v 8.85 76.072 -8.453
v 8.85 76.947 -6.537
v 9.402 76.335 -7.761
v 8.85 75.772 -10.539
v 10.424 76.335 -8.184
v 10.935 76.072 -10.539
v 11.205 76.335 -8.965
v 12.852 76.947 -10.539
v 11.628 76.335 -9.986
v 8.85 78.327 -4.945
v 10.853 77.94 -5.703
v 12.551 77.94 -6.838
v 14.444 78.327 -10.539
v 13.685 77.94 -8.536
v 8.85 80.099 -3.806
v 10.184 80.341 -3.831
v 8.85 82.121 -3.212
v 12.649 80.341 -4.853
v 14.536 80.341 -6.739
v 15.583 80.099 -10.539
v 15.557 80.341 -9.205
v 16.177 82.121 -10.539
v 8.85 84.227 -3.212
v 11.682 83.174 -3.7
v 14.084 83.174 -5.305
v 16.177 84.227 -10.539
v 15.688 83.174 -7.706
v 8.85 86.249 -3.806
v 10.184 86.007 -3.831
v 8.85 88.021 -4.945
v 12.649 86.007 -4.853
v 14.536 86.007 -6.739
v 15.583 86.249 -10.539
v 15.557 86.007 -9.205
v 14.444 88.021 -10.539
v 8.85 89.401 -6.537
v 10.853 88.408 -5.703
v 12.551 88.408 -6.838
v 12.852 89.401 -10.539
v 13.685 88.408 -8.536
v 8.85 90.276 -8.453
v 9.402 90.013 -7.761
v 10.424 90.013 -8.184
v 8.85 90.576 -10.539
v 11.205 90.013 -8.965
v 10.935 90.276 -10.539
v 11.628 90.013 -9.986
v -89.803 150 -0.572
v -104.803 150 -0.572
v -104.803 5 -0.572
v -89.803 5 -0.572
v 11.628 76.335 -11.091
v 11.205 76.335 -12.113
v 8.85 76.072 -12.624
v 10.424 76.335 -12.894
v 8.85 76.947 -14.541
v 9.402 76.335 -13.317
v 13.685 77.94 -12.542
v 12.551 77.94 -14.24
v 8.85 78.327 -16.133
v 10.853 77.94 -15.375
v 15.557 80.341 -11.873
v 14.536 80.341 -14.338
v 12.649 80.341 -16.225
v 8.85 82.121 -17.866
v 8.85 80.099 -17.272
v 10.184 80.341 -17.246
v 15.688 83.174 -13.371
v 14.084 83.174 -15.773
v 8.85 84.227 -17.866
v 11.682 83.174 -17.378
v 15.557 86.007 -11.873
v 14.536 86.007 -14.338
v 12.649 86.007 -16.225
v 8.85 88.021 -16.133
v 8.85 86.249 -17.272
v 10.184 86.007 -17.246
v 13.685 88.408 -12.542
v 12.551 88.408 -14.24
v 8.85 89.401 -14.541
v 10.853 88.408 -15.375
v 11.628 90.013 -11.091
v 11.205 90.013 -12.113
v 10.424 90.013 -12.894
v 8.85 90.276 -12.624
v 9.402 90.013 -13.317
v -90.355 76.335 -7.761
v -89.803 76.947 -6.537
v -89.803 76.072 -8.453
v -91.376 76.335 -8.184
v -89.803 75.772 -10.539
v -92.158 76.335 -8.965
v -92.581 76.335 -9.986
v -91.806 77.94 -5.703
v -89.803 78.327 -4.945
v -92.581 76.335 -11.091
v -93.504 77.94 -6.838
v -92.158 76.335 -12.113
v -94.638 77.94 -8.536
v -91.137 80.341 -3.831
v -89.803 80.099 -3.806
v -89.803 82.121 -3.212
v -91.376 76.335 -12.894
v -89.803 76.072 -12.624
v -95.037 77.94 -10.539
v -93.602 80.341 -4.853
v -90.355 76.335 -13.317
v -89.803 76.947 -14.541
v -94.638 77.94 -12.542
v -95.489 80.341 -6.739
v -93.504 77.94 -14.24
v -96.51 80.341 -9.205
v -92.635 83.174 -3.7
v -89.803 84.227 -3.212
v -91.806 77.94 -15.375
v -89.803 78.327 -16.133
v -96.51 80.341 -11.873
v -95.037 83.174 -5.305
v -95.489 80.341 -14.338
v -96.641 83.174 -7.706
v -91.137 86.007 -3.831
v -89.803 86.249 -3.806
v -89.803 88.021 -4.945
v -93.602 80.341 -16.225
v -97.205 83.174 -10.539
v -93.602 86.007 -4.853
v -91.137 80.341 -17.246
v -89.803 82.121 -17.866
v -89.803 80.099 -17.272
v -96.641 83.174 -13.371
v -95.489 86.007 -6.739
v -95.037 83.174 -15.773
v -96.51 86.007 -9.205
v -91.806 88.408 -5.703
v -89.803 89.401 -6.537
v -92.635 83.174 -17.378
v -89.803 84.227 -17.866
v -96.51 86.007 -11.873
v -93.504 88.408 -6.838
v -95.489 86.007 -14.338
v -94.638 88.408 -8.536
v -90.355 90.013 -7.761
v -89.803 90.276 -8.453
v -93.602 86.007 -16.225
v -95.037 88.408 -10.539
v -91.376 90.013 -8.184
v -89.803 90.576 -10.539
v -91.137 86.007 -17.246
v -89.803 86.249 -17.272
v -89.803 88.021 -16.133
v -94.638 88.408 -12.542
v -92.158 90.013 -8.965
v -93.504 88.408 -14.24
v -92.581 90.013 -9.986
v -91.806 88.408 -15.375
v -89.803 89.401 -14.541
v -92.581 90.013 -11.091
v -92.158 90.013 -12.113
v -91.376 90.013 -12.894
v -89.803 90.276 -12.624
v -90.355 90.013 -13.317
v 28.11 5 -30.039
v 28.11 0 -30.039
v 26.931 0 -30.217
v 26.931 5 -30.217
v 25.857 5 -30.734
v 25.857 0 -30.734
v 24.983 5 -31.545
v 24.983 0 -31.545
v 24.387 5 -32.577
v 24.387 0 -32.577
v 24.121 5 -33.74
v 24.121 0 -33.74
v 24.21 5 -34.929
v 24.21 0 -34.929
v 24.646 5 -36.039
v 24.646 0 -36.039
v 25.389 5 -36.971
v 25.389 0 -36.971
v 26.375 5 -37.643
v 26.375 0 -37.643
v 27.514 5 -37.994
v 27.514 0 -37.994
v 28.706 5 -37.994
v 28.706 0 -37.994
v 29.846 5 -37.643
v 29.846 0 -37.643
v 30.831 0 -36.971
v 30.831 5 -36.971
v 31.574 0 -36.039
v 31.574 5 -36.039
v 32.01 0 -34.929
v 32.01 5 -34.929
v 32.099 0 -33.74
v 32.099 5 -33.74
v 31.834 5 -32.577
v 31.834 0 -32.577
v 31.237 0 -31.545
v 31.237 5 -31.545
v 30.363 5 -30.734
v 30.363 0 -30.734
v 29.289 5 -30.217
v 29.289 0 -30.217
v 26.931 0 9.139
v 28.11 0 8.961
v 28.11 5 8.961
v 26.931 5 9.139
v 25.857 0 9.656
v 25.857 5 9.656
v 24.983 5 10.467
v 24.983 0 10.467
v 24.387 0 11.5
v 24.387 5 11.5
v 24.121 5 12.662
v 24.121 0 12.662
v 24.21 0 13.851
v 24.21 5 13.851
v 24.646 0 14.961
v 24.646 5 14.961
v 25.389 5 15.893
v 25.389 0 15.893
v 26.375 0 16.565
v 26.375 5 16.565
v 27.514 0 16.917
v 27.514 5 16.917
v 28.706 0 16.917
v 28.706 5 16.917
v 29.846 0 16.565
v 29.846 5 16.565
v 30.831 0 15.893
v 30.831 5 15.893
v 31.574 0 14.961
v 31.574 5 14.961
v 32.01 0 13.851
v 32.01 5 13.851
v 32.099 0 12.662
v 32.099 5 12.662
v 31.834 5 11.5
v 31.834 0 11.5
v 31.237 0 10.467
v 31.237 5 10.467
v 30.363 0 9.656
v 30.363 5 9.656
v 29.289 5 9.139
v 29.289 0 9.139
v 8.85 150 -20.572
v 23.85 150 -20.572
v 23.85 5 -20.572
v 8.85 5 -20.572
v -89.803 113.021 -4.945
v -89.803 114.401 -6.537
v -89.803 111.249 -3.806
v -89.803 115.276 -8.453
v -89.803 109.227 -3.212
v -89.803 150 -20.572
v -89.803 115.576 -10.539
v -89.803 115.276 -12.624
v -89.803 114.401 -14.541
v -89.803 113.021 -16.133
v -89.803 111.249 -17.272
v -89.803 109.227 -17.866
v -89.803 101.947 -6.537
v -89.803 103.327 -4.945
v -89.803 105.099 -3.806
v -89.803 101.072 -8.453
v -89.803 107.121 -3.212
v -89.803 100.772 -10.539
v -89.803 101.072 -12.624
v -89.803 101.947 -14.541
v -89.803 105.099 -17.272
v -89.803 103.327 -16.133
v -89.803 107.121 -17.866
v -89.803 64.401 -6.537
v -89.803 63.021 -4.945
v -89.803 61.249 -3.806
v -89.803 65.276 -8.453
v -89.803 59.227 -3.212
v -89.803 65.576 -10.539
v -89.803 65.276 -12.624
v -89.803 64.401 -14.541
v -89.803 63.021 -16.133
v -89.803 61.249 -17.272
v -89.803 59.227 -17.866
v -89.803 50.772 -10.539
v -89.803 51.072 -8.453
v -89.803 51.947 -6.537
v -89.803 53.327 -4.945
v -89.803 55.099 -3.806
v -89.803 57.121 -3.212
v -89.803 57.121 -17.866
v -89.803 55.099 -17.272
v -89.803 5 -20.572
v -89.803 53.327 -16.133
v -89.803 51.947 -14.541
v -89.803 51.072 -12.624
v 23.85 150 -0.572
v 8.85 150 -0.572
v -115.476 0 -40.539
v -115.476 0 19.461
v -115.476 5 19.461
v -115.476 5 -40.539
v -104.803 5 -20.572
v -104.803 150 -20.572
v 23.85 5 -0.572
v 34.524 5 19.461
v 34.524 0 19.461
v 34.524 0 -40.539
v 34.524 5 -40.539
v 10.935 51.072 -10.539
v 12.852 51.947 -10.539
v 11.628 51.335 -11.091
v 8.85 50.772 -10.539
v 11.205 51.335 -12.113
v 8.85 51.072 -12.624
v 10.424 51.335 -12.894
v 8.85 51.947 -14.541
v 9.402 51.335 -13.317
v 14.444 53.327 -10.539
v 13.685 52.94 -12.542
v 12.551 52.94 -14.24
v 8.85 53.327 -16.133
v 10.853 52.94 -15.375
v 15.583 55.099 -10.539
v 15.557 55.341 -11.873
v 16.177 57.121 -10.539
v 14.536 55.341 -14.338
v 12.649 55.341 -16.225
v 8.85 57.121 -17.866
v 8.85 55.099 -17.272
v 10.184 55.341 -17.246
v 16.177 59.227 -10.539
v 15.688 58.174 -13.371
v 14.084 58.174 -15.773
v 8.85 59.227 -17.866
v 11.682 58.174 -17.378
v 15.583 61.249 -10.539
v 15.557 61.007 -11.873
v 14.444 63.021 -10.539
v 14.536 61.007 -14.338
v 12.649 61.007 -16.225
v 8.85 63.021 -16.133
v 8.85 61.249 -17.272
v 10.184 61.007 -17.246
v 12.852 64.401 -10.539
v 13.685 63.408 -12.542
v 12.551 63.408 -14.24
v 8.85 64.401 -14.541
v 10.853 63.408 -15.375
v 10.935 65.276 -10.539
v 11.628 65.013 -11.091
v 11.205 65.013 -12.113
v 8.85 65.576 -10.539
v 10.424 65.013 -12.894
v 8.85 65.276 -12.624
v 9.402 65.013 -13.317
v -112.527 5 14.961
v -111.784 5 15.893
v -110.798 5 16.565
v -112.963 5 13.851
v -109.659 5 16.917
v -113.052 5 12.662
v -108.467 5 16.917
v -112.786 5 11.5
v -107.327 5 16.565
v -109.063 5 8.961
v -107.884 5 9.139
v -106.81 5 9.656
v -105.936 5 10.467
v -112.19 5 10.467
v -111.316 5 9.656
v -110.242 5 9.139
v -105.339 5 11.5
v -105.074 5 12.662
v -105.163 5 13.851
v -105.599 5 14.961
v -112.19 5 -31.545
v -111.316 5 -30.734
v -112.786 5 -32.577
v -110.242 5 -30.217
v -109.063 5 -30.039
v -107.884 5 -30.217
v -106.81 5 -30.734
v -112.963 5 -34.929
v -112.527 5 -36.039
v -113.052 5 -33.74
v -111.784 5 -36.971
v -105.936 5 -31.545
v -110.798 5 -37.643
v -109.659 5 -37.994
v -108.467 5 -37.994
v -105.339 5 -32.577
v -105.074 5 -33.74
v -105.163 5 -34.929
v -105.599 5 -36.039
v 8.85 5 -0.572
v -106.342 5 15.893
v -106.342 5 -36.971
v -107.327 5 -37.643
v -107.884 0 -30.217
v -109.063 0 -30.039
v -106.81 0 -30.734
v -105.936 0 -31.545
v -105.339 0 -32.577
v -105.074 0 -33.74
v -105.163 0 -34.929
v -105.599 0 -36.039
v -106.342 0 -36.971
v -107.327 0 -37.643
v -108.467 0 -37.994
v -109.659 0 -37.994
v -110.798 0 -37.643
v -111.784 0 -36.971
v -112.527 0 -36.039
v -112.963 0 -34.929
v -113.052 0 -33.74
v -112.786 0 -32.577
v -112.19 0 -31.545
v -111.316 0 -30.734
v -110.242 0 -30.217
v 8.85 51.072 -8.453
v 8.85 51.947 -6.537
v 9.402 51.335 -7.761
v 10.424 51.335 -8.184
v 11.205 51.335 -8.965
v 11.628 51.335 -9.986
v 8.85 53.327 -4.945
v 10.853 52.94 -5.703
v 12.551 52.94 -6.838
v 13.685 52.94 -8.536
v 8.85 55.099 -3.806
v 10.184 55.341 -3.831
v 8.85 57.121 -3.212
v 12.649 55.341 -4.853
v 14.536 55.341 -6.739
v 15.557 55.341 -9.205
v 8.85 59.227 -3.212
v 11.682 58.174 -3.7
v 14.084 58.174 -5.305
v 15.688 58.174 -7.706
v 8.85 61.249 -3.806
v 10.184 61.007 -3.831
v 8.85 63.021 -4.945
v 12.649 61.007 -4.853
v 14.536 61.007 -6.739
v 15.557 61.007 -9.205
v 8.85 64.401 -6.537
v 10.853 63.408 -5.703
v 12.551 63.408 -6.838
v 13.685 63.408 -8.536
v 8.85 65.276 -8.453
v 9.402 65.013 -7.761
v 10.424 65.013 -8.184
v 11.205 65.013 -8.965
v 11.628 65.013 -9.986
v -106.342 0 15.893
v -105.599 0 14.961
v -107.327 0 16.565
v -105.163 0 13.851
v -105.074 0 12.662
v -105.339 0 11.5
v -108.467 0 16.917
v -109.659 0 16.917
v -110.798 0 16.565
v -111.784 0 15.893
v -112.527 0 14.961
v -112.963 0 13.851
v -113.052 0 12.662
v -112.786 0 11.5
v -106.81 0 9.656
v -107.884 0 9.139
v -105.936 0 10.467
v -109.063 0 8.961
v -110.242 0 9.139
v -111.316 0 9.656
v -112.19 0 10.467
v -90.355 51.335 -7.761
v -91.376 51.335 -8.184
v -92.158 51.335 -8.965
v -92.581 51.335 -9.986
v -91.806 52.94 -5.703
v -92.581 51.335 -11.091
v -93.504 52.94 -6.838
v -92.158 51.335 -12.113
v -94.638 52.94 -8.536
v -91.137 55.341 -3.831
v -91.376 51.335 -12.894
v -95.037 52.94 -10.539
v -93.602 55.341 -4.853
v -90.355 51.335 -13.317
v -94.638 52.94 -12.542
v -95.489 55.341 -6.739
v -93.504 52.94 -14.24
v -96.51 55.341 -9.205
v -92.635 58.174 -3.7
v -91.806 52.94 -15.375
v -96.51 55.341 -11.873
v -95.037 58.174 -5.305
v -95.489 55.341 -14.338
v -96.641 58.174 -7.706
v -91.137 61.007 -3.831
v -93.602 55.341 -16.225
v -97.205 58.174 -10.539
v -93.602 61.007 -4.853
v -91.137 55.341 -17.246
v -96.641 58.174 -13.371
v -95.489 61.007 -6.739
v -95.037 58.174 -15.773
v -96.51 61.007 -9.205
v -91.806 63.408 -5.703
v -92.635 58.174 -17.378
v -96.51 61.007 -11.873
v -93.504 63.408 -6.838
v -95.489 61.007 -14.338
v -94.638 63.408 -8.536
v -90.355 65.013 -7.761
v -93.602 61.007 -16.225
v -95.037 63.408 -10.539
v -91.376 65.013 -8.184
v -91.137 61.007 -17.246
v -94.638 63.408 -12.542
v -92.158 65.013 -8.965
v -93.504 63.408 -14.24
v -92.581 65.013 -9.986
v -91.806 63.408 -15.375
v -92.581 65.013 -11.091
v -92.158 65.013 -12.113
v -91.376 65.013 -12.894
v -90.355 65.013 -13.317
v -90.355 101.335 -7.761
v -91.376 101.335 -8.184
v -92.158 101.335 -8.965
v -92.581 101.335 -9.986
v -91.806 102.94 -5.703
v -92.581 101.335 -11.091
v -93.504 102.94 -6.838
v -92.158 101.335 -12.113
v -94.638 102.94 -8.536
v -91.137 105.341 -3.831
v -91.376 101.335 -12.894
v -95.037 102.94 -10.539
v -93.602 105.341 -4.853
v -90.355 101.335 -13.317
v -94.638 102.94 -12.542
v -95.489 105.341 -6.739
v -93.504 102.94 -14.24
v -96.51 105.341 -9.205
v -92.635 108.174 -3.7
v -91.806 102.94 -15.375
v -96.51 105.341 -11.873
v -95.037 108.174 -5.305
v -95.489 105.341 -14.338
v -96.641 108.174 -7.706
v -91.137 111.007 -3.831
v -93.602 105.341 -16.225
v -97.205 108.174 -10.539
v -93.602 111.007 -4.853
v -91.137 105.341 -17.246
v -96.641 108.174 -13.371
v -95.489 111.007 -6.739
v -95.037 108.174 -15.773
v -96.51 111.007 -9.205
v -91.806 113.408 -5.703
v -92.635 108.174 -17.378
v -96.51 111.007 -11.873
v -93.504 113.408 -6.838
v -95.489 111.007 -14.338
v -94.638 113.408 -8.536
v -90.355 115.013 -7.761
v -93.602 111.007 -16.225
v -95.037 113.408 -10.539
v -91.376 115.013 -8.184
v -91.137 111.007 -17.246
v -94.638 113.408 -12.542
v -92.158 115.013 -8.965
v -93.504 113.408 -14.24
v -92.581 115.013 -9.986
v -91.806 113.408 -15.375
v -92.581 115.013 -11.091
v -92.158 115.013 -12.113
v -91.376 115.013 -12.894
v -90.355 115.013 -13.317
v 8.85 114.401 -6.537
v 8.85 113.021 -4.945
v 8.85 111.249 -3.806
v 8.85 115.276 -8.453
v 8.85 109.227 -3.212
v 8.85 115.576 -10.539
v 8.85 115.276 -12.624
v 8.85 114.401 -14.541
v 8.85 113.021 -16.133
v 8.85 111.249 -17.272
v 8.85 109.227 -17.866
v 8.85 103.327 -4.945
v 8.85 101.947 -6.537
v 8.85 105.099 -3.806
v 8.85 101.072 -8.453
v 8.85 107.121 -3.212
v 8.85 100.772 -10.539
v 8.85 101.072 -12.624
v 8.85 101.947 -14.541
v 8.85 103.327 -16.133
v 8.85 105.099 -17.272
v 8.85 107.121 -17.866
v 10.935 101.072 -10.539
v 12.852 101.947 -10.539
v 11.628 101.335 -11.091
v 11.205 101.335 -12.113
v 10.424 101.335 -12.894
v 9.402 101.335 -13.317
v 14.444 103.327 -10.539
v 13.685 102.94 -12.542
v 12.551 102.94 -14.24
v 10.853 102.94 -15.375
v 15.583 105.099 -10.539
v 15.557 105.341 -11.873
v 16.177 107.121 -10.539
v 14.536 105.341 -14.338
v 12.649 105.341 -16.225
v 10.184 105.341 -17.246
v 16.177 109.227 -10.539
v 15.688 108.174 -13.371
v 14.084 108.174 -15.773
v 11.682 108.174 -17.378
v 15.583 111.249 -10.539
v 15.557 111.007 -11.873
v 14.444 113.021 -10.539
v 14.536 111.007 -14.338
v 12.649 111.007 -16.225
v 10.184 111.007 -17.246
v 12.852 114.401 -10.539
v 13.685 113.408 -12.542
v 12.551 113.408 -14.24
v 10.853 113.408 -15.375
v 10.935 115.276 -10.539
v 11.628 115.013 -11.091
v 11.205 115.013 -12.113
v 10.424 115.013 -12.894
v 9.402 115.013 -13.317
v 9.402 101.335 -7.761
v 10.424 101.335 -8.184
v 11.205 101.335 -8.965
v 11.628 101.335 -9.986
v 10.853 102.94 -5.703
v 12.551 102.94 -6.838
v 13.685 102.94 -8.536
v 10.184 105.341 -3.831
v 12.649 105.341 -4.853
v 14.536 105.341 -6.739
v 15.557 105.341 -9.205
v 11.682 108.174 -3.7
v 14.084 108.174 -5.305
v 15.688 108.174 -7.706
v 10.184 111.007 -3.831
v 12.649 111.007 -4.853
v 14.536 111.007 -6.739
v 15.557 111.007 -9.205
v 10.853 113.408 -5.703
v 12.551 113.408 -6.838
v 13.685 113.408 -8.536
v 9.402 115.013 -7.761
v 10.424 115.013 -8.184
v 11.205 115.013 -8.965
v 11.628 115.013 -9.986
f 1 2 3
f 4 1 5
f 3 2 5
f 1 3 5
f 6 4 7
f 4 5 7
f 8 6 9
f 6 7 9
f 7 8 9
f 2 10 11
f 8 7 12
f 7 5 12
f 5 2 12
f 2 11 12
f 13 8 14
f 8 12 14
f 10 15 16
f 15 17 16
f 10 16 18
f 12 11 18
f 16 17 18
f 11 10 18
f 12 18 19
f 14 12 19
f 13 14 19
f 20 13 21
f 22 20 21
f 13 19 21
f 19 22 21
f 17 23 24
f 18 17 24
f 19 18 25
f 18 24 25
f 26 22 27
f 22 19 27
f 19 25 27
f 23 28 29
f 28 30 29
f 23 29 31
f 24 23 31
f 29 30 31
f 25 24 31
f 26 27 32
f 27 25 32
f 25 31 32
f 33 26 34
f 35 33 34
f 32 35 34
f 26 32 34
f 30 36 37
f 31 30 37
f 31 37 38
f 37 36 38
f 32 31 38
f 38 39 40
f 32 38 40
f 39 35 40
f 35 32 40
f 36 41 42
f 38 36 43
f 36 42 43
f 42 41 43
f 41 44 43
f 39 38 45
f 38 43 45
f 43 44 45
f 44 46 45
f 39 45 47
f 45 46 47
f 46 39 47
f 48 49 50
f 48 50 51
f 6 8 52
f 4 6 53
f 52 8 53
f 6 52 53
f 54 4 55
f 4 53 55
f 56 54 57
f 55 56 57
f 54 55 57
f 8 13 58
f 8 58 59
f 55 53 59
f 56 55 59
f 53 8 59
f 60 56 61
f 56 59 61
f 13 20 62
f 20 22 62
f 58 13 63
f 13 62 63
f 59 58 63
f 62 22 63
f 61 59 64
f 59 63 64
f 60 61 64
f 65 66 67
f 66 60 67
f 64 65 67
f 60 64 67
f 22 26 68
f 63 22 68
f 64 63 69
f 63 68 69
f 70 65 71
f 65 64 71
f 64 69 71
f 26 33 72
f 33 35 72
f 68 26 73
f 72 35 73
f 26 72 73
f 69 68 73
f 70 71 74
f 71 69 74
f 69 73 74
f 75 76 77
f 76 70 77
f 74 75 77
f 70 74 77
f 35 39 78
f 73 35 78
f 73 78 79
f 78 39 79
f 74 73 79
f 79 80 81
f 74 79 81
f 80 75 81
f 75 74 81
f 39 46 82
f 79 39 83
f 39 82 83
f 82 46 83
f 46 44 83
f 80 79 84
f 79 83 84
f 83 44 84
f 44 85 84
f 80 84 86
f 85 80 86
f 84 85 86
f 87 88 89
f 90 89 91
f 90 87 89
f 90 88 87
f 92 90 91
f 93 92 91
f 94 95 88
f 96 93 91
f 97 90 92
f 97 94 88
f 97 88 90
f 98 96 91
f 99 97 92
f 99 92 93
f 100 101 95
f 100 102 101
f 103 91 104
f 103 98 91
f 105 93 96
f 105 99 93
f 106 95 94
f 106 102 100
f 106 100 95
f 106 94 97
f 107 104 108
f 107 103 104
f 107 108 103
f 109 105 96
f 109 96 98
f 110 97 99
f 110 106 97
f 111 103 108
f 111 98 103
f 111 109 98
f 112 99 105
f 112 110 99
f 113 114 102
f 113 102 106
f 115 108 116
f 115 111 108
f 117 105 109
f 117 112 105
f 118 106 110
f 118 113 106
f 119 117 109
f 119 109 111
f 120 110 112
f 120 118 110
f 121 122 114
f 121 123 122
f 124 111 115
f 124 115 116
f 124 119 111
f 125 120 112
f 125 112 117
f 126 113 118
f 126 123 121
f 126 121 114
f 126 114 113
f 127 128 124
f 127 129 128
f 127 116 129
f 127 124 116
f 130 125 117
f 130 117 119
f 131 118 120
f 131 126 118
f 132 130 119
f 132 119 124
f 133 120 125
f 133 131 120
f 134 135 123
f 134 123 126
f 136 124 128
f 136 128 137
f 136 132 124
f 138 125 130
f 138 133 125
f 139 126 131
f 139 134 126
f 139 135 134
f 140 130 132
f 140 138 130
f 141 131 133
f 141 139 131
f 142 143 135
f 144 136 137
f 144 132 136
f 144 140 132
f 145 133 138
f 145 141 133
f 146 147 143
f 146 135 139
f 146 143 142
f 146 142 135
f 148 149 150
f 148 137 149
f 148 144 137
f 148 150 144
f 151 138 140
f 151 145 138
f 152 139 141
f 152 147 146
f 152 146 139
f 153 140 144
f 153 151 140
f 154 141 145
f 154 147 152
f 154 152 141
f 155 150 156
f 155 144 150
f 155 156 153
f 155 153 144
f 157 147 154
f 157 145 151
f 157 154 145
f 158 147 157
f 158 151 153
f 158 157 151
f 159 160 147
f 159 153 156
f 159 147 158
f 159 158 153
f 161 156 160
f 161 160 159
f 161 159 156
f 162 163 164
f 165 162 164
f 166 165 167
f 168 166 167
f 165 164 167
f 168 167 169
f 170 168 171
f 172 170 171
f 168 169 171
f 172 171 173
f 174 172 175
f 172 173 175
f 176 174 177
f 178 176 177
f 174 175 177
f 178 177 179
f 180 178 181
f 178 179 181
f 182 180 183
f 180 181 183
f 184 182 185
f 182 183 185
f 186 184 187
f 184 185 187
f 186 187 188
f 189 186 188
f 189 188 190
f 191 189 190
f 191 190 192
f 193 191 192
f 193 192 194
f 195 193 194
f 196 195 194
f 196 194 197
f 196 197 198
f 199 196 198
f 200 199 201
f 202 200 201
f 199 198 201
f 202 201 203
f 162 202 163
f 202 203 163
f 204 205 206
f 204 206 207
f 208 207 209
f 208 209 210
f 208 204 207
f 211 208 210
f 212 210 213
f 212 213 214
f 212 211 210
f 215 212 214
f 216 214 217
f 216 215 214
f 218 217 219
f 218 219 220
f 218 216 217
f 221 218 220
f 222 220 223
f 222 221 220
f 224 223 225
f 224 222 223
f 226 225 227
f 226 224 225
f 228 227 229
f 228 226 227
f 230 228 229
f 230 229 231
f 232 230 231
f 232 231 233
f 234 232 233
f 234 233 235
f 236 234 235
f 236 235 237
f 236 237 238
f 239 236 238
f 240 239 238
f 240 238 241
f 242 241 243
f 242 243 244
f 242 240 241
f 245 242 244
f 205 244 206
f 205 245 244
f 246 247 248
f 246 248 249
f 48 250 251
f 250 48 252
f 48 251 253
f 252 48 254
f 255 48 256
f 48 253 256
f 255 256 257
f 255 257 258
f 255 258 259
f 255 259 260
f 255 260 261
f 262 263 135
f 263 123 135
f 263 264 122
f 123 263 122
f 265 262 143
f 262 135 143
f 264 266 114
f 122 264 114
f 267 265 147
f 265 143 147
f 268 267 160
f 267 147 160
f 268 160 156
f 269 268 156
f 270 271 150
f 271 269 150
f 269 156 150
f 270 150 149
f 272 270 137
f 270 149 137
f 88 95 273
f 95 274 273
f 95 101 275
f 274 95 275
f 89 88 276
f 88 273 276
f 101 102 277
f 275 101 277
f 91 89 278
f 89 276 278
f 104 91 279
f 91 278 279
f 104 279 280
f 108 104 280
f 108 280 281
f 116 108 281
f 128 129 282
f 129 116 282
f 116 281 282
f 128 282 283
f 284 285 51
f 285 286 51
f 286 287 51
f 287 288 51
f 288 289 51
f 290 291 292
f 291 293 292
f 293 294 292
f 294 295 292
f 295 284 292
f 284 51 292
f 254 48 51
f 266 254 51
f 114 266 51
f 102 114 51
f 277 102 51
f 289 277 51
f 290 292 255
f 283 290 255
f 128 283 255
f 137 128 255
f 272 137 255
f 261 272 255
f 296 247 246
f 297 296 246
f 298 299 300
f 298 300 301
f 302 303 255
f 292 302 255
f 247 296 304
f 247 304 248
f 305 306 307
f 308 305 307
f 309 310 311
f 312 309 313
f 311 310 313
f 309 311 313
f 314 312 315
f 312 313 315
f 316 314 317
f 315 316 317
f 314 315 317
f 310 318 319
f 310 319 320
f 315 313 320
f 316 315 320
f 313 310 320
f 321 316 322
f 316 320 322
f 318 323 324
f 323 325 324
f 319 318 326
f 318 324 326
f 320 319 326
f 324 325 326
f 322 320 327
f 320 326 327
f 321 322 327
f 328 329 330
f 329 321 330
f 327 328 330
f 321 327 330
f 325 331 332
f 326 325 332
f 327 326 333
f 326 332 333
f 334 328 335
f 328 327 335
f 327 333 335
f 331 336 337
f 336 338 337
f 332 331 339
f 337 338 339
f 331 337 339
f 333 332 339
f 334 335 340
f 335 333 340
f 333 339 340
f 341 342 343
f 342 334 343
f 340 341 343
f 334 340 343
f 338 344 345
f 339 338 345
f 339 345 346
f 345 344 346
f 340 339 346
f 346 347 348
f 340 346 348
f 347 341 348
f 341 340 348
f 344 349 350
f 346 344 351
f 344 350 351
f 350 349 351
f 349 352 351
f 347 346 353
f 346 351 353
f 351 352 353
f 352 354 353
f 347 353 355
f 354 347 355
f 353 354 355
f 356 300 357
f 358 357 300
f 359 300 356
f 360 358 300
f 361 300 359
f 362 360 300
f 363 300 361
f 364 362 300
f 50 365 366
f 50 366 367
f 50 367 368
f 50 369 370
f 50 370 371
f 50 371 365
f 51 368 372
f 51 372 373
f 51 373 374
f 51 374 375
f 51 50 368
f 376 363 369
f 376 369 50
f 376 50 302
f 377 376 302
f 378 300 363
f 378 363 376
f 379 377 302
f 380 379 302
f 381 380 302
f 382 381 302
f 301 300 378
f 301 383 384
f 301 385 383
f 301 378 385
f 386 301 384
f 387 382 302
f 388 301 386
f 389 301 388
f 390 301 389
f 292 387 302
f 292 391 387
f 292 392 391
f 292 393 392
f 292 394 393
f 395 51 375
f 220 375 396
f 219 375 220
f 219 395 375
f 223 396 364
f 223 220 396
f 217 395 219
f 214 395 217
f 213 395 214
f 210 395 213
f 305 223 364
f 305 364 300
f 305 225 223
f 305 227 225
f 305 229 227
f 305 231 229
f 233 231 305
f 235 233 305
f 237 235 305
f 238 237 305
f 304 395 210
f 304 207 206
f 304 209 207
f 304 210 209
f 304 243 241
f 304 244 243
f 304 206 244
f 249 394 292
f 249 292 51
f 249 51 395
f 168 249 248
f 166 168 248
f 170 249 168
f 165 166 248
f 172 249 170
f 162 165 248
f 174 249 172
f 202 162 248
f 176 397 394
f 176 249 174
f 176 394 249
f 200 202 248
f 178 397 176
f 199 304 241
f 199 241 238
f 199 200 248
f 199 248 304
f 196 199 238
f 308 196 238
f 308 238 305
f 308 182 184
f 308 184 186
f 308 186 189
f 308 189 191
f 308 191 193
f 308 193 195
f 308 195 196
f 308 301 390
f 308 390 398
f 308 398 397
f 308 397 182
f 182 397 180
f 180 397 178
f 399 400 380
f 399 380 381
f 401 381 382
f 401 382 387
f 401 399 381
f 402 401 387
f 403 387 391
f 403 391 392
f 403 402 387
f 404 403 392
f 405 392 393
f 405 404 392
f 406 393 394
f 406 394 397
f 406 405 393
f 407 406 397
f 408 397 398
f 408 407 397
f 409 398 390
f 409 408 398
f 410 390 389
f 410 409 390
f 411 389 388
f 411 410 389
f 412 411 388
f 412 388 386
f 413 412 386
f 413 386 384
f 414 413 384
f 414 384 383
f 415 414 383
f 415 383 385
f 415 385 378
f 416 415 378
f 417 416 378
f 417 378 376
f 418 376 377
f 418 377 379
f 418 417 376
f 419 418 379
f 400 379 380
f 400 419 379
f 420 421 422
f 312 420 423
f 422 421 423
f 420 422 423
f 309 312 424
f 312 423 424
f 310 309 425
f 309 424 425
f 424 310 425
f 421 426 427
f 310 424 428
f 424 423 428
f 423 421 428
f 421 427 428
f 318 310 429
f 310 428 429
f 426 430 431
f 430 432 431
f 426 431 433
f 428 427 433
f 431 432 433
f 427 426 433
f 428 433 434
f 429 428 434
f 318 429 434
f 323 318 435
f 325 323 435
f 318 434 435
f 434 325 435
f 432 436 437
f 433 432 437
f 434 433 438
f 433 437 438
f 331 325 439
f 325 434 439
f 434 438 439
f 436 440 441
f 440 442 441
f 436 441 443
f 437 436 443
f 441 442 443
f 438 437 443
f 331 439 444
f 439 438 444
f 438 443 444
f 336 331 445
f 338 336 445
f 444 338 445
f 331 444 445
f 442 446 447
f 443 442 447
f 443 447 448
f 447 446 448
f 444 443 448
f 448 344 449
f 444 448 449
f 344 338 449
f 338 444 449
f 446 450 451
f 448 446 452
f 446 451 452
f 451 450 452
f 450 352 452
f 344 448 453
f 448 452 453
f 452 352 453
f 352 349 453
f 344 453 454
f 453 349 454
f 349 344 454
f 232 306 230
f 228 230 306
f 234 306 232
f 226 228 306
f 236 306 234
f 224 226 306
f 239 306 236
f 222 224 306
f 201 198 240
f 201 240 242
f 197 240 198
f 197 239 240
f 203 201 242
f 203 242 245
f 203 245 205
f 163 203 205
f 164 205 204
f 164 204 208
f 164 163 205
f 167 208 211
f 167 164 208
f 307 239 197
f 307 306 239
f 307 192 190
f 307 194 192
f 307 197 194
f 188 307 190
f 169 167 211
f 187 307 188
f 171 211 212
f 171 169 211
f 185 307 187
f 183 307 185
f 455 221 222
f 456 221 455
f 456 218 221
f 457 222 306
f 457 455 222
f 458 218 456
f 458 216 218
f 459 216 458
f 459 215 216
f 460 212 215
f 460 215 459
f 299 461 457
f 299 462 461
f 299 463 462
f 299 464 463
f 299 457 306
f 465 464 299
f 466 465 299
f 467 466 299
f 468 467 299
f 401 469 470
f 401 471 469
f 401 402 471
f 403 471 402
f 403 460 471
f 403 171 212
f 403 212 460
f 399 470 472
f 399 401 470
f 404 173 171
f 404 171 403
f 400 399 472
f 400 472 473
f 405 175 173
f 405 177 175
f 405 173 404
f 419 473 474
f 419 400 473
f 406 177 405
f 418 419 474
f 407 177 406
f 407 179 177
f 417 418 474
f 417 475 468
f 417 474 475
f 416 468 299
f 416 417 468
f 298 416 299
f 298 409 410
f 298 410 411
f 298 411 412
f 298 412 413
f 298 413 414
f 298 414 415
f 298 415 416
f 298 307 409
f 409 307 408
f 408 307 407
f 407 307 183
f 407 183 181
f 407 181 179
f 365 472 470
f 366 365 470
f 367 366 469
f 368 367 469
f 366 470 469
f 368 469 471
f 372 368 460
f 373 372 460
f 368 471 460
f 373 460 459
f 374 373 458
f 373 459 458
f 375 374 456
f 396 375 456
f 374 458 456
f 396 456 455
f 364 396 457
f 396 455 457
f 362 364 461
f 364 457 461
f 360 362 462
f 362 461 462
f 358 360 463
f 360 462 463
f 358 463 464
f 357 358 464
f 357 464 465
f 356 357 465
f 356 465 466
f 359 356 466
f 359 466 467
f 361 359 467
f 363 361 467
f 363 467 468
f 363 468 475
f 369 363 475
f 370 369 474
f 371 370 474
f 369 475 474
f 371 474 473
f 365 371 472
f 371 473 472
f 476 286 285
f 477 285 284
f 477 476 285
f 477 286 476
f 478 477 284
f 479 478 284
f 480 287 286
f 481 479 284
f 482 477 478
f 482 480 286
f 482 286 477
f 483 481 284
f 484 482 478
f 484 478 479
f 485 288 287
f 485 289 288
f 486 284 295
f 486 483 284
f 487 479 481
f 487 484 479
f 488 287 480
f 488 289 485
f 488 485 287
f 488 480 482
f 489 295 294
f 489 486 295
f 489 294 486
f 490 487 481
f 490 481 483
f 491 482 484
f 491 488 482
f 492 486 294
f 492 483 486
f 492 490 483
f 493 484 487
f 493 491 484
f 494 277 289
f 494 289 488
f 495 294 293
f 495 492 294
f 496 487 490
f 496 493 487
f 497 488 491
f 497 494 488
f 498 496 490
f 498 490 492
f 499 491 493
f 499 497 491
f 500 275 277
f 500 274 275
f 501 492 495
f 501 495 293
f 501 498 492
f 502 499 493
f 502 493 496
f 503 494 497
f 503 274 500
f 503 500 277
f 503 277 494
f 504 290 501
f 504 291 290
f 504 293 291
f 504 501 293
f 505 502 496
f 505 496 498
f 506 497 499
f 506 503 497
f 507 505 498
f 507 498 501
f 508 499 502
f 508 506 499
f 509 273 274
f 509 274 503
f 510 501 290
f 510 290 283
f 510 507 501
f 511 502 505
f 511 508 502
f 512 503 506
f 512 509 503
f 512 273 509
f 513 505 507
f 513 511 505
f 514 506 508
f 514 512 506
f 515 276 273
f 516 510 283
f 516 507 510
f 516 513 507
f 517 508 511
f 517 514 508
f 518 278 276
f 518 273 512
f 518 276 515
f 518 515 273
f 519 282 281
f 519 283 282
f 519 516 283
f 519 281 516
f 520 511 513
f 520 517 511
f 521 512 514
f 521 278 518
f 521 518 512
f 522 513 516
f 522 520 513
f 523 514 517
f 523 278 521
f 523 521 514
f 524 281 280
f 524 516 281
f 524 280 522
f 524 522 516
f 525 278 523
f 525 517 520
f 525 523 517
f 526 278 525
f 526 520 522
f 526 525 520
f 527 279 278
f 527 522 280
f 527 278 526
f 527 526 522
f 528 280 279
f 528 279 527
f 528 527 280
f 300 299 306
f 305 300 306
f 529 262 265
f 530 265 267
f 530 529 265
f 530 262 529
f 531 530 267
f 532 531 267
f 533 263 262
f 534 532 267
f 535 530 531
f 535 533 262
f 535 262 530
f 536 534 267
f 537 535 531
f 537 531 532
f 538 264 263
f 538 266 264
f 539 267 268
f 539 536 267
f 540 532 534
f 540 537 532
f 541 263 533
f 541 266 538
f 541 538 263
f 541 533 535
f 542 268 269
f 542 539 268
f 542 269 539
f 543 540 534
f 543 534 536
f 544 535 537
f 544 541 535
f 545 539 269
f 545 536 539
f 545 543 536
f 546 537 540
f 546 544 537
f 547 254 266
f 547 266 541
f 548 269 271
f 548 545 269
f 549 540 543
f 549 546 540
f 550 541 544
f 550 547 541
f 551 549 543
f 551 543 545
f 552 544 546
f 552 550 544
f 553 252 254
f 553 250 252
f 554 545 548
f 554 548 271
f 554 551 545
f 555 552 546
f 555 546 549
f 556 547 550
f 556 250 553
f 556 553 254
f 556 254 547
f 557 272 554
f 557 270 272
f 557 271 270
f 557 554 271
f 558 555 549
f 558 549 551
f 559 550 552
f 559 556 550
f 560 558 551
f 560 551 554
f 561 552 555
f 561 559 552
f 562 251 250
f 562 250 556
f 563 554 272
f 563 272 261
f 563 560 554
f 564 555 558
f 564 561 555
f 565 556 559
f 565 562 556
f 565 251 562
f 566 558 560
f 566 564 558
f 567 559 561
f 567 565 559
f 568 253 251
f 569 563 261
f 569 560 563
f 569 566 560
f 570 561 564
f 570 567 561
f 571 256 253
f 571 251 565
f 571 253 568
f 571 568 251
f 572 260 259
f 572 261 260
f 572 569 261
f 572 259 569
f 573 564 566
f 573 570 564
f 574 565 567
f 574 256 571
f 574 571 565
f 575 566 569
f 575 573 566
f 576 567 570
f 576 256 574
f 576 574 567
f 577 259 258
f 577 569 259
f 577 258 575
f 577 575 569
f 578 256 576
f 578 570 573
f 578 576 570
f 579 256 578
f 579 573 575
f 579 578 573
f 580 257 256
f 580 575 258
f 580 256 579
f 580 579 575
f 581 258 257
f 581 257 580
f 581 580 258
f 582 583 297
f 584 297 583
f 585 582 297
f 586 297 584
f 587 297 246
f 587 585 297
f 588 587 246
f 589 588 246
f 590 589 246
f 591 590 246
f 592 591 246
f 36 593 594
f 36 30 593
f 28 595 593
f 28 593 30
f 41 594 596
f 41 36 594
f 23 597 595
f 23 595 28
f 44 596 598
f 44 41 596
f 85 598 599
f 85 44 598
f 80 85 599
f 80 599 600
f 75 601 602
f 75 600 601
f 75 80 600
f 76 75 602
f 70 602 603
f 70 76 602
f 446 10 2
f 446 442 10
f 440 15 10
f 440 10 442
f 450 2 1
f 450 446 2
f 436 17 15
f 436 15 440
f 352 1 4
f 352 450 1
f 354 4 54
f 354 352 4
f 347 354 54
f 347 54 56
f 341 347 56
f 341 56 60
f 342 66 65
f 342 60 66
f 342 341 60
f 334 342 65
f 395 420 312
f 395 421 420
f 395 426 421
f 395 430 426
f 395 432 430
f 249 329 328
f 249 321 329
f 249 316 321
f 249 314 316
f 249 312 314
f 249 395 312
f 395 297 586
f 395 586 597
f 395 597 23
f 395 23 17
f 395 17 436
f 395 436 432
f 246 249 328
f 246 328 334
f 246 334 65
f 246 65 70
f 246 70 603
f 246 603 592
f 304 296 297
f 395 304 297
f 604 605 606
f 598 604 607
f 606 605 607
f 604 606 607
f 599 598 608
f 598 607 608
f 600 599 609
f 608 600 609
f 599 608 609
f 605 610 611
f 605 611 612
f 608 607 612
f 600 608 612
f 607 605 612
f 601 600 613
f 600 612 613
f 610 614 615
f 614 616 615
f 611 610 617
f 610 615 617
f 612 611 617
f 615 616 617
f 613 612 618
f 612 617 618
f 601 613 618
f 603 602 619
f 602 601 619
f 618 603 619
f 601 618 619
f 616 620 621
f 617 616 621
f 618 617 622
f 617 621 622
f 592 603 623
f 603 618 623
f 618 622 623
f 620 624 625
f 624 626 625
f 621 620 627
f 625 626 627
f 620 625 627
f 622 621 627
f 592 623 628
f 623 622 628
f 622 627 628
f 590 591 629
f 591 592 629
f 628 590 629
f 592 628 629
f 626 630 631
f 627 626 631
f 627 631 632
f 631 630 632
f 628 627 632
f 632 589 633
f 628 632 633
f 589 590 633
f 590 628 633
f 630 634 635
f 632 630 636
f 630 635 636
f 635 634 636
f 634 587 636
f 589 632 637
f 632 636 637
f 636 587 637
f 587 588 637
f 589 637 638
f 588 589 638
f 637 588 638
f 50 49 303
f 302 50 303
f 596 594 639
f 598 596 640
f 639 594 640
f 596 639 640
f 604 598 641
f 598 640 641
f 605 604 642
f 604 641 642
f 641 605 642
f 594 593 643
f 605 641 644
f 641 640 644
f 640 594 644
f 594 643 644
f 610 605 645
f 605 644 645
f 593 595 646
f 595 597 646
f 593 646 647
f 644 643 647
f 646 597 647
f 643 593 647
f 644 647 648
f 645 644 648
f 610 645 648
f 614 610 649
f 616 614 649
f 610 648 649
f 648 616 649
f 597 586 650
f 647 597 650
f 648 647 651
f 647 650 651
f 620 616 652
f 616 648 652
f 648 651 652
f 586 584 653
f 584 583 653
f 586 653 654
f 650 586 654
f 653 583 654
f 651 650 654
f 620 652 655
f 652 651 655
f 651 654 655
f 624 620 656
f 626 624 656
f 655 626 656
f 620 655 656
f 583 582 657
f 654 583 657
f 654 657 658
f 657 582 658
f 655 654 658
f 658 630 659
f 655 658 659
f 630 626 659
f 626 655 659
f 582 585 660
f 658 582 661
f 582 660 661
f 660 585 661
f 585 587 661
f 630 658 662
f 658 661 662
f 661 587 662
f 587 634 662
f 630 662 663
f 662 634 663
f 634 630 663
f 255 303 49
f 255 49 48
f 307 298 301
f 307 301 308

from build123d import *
from build123d.topology import SkipClean

# Parameters (mm, degrees)
SKETCH_2_W                 = 150
SKETCH_2_H                 = 60
EXTRUDE_1_DEPTH            = 5
SKETCH_3_W                 = 15
SKETCH_3_H                 = 20
EXTRUDE_2_DEPTH            = 150
PATTERN_LINEAR_1_COUNT     = 2
PATTERN_LINEAR_1_PITCH     = 25
PATTERN_LINEAR_1_COL_COUNT = 2
PATTERN_LINEAR_1_COL_PITCH = 25
SKETCH_22_R                = 4
CUT_EXTRUDE_3_DEPTH        = 5
MIRROR_19_COPY_1_SKETCH_R  = 4
MIRROR_19_COPY_1_DEPTH     = 5


with BuildPart() as part:
    # 草图2 → 凸台-拉伸1 (new body)
    with BuildSketch(Plane(origin=(0, 0, 0), x_dir=(1, 0, 0), z_dir=(0, 1, 0))):
        with Locations((-40.476378725, 10.538808084)):
            Rectangle(SKETCH_2_W, SKETCH_2_H)
    extrude(amount=EXTRUDE_1_DEPTH)

    # 草图3 → 凸台-拉伸2 (add)
    with BuildSketch(Plane(origin=(0, 0, 0), x_dir=(1, 0, 0), z_dir=(0, 1, 0))):
        with Locations((-97.302512432, 10.572361891)):
            Rectangle(SKETCH_3_W, SKETCH_3_H)
    extrude_2 = extrude(amount=EXTRUDE_2_DEPTH)

    # 草图19 → 切除-旋转29 (revolve, cut)
    with BuildSketch(Plane.XY.offset(-10.538808084)):
        with BuildLine():
            Line((-89.802512432, 90.57618696), (-89.802512432, 75.771839239))
            ThreePointArc((-89.802512432, 75.771839239), (-97.204686292, 83.1740131), (-89.802512432, 90.57618696))
        make_face()
    cut_revolve_29 = revolve(axis=Axis((-89.802512432, 90.57618696, -10.538808084), (0, -1, 0)), mode=Mode.SUBTRACT)

    # 阵列(线性)1: 切除-旋转29 ×2
    with Locations(*[(0, i * PATTERN_LINEAR_1_PITCH, 0) for i in range(1, PATTERN_LINEAR_1_COUNT)]):
        add(cut_revolve_29, mode=Mode.SUBTRACT)

    # 阵列(线性)1 col: 切除-旋转29 ×2
    with Locations(*[(0, -i * PATTERN_LINEAR_1_COL_PITCH, 0) for i in range(1, PATTERN_LINEAR_1_COL_COUNT)]):
        add(cut_revolve_29, mode=Mode.SUBTRACT)

    # 草图22 → 切除-拉伸3 (cut)
    with BuildSketch(Plane(origin=(0, 0, 0), x_dir=(1, 0, 0), z_dir=(0, 1, 0))):
        with Locations(Location((-109.062885819, 34.038808084, 0), (0, 0, 270))):
            Circle(SKETCH_22_R)
    cut_extrude_3 = extrude(amount=CUT_EXTRUDE_3_DEPTH, mode=Mode.SUBTRACT)

    # 镜向18: 切除-拉伸3 across plane
    add(cut_extrude_3.mirror(Plane.XY.offset(-10.538808084)), mode=Mode.SUBTRACT)

    # 镜向19: 切除-拉伸3 across plane
    add(cut_extrude_3.mirror(Plane(origin=(-40.476378725, 0, 0), x_dir=(0, 0, 1), z_dir=(1, 0, 0))), mode=Mode.SUBTRACT)

    # 镜向19 copy 1 sketch → 镜向19 copy 1 (cut)
    with BuildSketch(Plane(origin=(-80.95275745, 0, -21.077616169), x_dir=(-1, 0, 0), z_dir=(0, 1, 0))):
        with Locations(Location((-109.062885819, 34.038808084, 0), (0, 0, 270))):
            Circle(MIRROR_19_COPY_1_SKETCH_R)
    extrude(amount=MIRROR_19_COPY_1_DEPTH, mode=Mode.SUBTRACT)

    # 镜向20: 凸台-拉伸2 across plane
    add(extrude_2.mirror(Plane(origin=(-40.476378725, 0, 0), x_dir=(0, 0, 1), z_dir=(1, 0, 0))))

    # 镜向21: 切除-旋转29 across plane
    with SkipClean():  # the faces are left unmerged after this step: merging them gives an invalid solid
        add(cut_revolve_29.mirror(Plane(origin=(-40.476378725, 0, 0), x_dir=(0, 0, 1), z_dir=(1, 0, 0))), mode=Mode.SUBTRACT)

    # 镜向22 copy 1 sketch → 镜向22 copy 1 (revolve, cut)
    with SkipClean():  # the faces are left unmerged after this step: merging them gives an invalid solid
        with BuildSketch(Plane(origin=(-80.95275745, 25, -10.538808084), x_dir=(-1, 0, 0), z_dir=(0, 0, 1))):
            with BuildLine():
                Line((-89.802512432, -90.57618696), (-89.802512432, -75.771839239))
                ThreePointArc((-89.802512432, -75.771839239), (-97.204686292, -83.1740131), (-89.802512432, -90.57618696))
            make_face()
        revolve(axis=Axis((8.849754981, 115.57618696, -10.538808084), (0, 1, 0)), mode=Mode.SUBTRACT)

    # 镜向22 copy 2 sketch → 镜向22 copy 2 (revolve, cut)
    with SkipClean():  # the faces are left unmerged after this step: merging them gives an invalid solid
        with BuildSketch(Plane(origin=(-80.95275745, -25, -10.538808084), x_dir=(-1, 0, 0), z_dir=(0, 0, 1))):
            with BuildLine():
                Line((-89.802512432, -90.57618696), (-89.802512432, -75.771839239))
                ThreePointArc((-89.802512432, -75.771839239), (-97.204686292, -83.1740131), (-89.802512432, -90.57618696))
            make_face()
        revolve(axis=Axis((8.849754981, 65.57618696, -10.538808084), (0, 1, 0)), mode=Mode.SUBTRACT)

    # 镜向22 copy 3 sketch → 镜向22 copy 3 (revolve, cut)
    with SkipClean():  # the faces are left unmerged after this step: merging them gives an invalid solid
        with BuildSketch(Plane(origin=(-80.95275745, 0, -10.538808084), x_dir=(-1, 0, 0), z_dir=(0, 0, 1))):
            with BuildLine():
                Line((-89.802512432, -90.57618696), (-89.802512432, -75.771839239))
                ThreePointArc((-89.802512432, -75.771839239), (-97.204686292, -83.1740131), (-89.802512432, -90.57618696))
            make_face()
        revolve(axis=Axis((8.849754981, 90.57618696, -10.538808084), (0, 1, 0)), mode=Mode.SUBTRACT)


solid = part.part
